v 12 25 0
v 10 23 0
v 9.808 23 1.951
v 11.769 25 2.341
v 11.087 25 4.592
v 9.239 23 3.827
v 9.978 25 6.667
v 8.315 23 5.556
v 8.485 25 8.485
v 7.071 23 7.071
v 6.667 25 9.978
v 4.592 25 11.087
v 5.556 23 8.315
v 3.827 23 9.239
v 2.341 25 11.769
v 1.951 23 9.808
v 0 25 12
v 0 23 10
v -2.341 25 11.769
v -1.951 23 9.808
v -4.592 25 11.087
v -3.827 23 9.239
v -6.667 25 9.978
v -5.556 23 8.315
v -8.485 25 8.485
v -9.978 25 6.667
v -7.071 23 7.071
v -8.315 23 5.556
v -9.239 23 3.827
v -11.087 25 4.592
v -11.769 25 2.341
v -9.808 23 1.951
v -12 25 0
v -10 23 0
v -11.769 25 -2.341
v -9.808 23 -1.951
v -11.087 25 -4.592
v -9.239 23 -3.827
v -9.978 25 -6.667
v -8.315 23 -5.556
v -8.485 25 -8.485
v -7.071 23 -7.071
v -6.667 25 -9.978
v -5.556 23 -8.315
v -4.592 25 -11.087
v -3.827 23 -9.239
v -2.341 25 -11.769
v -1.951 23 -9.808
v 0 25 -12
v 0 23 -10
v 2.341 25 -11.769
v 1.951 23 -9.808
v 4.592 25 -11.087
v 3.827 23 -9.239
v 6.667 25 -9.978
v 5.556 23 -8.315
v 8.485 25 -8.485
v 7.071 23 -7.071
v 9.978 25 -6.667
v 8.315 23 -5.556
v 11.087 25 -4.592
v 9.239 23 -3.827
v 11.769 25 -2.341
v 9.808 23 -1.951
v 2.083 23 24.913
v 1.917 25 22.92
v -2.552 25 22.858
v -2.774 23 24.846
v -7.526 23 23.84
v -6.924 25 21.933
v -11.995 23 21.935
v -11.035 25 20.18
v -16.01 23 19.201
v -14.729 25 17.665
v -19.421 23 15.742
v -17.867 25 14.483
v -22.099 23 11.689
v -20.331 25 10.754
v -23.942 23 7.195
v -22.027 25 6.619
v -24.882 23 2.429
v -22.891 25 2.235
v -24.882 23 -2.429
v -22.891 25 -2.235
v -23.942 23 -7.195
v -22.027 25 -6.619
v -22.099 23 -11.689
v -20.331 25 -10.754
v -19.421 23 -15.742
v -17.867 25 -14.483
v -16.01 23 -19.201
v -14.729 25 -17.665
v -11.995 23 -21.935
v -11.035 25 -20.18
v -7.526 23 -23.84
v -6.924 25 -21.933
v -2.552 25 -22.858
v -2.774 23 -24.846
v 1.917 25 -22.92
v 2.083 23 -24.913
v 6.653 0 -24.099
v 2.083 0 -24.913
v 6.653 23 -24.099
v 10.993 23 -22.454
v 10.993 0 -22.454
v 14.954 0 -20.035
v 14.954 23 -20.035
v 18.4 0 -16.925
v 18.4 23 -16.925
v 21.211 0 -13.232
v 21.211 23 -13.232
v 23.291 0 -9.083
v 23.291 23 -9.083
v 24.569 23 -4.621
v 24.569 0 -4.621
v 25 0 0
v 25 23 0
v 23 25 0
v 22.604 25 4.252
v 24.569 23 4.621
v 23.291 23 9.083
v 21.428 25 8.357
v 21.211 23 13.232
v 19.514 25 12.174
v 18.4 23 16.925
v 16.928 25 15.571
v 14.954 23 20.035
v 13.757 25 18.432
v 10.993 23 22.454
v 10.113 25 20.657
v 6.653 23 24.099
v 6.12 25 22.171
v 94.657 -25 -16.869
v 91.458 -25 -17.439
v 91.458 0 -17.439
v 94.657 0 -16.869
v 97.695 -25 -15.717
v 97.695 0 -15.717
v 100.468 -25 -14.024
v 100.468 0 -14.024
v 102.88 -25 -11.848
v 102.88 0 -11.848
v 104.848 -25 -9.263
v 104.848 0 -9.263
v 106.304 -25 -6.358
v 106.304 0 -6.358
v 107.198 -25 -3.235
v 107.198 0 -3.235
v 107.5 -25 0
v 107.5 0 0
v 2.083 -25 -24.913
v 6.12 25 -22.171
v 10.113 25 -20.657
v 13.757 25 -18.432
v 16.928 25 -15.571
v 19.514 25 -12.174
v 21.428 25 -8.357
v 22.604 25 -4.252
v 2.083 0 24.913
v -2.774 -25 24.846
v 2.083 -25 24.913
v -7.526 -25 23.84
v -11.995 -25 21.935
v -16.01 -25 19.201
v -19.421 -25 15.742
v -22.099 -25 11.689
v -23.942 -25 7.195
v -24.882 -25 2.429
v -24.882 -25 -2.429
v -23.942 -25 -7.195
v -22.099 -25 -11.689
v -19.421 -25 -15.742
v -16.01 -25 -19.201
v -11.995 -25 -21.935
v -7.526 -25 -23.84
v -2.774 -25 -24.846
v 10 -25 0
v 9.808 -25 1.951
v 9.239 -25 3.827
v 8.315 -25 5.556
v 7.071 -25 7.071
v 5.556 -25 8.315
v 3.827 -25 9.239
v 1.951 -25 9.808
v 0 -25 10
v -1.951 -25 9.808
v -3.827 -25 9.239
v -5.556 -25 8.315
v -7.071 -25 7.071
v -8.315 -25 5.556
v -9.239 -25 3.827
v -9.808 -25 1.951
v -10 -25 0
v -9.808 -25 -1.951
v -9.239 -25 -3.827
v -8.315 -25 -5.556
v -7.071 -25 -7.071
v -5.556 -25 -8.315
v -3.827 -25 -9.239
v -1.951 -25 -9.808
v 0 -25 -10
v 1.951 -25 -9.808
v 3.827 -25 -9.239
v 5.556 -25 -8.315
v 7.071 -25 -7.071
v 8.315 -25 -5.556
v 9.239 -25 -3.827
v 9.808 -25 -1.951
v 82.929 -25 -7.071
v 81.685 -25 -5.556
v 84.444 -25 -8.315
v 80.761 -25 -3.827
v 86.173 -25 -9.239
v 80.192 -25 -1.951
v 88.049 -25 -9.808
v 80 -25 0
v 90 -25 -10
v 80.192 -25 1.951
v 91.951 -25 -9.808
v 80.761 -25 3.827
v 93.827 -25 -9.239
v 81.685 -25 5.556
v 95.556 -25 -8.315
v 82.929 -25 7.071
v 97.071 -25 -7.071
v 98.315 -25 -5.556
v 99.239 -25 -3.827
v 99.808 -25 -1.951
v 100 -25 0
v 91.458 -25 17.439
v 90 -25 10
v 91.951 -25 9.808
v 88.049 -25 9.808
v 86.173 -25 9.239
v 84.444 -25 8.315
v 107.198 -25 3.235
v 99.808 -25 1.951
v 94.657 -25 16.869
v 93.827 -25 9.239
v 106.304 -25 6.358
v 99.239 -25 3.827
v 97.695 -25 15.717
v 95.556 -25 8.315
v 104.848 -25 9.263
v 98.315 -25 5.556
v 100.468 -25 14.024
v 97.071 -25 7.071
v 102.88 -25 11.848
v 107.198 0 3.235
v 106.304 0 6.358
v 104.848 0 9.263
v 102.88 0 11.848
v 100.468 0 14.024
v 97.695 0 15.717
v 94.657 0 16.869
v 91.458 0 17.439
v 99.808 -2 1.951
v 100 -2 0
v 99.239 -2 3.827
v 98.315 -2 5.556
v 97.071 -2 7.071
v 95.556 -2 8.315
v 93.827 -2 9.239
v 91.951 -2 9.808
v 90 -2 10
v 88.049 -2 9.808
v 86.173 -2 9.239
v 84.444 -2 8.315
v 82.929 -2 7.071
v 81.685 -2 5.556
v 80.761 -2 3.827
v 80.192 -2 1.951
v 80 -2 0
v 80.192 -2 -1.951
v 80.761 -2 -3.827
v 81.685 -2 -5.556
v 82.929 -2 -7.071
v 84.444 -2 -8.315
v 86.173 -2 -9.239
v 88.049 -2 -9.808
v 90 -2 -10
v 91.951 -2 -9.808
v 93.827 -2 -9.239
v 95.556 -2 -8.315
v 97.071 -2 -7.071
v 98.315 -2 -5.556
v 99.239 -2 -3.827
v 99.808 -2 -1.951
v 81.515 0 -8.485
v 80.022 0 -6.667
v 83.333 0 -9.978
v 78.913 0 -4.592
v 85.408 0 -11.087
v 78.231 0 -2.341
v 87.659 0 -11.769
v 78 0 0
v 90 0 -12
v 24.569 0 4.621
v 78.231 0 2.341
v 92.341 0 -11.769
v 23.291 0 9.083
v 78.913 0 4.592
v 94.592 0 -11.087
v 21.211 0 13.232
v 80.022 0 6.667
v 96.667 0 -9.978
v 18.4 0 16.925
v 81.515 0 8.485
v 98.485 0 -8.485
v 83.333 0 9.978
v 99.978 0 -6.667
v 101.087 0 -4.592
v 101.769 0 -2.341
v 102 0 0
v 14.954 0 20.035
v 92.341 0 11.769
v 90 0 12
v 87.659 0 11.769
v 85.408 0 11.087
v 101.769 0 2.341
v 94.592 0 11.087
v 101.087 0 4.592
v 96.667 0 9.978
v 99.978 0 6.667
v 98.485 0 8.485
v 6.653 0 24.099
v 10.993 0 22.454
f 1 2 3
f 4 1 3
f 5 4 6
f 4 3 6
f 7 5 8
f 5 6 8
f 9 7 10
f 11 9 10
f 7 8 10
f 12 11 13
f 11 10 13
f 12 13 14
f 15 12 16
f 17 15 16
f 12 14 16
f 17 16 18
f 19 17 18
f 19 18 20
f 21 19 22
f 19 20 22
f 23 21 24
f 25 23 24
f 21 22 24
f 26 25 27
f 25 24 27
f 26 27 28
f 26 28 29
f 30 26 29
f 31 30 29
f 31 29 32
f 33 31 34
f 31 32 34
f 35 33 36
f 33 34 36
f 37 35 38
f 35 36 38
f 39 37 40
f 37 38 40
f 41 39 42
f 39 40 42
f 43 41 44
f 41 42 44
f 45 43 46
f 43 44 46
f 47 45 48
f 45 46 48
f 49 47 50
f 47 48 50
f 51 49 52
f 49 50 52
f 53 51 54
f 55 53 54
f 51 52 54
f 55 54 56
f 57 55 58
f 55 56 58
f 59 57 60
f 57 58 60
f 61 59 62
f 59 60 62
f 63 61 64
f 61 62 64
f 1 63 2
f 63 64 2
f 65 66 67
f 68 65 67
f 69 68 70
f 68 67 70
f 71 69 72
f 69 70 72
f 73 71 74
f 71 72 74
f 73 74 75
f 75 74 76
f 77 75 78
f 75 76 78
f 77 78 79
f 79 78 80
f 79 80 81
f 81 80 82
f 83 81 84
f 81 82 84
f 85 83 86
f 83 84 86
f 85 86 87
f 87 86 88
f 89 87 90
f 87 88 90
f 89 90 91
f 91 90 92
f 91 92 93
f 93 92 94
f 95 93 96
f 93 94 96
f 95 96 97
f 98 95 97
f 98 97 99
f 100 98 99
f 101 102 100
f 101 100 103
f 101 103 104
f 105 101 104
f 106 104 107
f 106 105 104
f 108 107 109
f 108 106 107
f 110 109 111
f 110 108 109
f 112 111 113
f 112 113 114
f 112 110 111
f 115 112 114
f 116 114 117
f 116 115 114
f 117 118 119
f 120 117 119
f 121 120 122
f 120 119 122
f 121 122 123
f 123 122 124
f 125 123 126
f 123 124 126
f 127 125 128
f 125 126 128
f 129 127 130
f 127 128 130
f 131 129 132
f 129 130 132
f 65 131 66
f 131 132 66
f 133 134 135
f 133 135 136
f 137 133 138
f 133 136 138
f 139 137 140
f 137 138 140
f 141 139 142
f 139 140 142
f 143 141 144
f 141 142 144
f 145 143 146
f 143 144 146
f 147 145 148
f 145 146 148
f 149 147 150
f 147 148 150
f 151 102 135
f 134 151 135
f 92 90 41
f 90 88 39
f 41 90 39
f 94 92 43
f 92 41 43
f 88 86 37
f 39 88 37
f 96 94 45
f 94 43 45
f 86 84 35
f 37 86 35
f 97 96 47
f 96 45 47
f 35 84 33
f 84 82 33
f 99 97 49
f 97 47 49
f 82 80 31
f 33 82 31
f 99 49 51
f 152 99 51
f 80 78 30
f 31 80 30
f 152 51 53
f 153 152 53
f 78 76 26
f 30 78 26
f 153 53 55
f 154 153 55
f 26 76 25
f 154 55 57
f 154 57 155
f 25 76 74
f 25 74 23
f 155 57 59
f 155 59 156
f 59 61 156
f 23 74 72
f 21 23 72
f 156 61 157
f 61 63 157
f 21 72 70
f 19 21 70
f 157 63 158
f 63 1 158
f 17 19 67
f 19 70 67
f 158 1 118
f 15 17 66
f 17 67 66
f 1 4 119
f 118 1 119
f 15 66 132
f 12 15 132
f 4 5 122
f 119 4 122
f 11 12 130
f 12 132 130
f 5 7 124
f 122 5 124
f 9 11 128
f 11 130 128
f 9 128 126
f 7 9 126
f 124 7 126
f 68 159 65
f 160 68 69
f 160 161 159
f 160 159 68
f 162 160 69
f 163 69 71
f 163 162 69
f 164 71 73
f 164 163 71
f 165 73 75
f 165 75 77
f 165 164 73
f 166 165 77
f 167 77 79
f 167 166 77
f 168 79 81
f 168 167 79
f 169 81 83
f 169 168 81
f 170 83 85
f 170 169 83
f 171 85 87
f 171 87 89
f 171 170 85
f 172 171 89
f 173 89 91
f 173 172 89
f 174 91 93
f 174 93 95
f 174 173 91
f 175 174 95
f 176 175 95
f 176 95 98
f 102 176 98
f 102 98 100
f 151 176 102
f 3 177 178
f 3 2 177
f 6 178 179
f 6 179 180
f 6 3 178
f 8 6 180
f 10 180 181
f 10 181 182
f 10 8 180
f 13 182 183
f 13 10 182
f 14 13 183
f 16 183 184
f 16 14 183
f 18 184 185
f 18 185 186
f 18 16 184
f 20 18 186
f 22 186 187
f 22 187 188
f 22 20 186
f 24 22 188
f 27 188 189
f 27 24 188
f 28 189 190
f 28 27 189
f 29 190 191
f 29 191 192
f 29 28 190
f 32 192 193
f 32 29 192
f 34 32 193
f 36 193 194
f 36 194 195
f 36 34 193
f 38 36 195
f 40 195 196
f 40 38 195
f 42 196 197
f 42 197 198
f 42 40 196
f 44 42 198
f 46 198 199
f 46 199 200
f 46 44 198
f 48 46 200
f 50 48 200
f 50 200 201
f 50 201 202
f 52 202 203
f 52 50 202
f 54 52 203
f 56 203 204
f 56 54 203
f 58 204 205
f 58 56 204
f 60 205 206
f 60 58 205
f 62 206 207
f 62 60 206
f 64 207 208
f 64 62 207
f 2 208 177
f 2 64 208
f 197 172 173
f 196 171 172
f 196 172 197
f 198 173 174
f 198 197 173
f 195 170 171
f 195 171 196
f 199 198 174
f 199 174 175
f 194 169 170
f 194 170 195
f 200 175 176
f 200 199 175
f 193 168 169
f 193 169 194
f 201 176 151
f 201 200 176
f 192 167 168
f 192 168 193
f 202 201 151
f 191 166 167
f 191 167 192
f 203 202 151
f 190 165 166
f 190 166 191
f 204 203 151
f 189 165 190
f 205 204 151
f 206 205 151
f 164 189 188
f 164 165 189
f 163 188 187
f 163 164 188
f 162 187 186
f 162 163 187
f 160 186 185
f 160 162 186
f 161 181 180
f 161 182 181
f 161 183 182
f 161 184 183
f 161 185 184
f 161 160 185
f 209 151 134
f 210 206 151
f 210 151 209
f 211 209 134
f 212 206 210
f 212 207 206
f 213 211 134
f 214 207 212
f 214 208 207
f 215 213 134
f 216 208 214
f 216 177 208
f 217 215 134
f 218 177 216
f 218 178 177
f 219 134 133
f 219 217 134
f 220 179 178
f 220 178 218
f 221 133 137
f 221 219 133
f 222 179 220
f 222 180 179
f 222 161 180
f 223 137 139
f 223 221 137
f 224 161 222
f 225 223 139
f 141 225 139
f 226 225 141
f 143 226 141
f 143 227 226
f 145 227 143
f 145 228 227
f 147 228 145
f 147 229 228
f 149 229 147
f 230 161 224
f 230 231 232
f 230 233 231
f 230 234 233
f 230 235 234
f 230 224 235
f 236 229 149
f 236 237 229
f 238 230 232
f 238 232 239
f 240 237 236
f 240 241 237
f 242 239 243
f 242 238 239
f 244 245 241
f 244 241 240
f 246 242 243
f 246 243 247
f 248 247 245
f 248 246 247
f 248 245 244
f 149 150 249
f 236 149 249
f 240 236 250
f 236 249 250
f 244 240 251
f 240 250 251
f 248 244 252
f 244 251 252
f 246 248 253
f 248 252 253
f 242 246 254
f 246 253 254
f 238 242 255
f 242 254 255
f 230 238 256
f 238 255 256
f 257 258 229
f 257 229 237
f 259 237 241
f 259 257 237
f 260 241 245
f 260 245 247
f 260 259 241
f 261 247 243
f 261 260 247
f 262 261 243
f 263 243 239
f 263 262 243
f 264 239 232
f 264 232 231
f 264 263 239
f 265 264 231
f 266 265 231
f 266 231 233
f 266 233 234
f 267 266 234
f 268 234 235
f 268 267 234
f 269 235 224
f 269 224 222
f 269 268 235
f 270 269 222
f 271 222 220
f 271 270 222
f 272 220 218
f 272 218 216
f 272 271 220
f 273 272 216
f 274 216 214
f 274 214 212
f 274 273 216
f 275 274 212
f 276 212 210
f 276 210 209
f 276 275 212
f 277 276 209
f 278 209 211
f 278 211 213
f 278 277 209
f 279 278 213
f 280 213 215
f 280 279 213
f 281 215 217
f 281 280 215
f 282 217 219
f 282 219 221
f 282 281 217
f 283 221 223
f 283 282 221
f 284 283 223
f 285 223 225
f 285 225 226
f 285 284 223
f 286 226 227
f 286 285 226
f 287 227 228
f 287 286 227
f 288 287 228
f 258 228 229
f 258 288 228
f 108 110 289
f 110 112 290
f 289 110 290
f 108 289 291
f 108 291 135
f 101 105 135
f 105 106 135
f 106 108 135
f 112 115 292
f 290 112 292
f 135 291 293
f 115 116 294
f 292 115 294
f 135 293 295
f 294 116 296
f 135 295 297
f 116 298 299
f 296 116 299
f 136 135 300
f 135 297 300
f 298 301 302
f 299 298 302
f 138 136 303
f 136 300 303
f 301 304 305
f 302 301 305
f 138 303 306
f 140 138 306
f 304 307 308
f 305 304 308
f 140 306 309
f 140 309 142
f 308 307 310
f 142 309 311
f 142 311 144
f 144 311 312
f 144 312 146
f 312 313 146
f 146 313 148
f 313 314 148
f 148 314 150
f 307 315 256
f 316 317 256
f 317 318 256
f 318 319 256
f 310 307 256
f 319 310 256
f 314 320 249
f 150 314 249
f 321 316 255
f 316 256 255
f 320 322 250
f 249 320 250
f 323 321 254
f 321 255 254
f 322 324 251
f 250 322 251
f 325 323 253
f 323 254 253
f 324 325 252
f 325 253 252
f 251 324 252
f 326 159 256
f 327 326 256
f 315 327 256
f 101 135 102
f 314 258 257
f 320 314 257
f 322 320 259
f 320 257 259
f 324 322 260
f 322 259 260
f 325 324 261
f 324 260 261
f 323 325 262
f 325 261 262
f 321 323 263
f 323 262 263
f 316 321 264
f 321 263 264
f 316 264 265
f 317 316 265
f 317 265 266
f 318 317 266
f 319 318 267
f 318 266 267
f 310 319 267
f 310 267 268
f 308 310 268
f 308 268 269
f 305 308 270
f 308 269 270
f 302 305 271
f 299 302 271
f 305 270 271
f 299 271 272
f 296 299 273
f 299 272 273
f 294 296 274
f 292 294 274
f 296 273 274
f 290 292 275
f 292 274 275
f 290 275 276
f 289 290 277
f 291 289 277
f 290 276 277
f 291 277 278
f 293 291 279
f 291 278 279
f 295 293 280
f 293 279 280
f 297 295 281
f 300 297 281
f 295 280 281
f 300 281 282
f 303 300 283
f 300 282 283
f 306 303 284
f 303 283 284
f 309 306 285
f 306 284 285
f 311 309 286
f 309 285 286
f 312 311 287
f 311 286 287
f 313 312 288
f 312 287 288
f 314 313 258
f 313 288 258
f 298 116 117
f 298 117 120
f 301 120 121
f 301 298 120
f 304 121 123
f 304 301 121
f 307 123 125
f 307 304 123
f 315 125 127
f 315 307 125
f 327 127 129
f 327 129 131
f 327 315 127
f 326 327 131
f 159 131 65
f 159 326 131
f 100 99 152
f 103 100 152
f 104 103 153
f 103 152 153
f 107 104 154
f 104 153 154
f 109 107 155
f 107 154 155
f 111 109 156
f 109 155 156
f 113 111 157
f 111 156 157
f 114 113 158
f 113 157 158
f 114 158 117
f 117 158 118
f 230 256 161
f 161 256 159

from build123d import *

# Parameters (mm, degrees)
F0_R          = 10
F1_DEPTH      = 25
F2_DEPTH      = 25
F2_DEPTH_BACK = 25
F3_SIZE       = 2


with BuildPart() as f1:
    # F0 (on Front) → F1 (new body)
    with BuildSketch(Plane.XZ):
        with BuildLine():
            ThreePointArc((2.083333, -24.913043), (18.399502, -16.92508), (25, 0))
            ThreePointArc((25, 0), (18.399502, 16.92508), (2.083333, 24.913043))
            ThreePointArc((2.083333, 24.913043), (-25, 0), (2.083333, -24.913043))
        make_face()
        Circle(F0_R, mode=Mode.SUBTRACT)
        with BuildLine():
            ThreePointArc((2.083333, 24.913043), (18.399502, 16.92508), (25, 0))
            ThreePointArc((25, 0), (18.399502, -16.92508), (2.083333, -24.913043))
            Line((2.083333, -24.913043), (91.458333, -17.43913))
            ThreePointArc((91.458333, -17.43913), (72.5, 0), (91.458333, 17.43913))
            Line((91.458333, 17.43913), (2.083333, 24.913043))
        make_face()
        with BuildLine():
            ThreePointArc((107.5, 0), (102.879651, 11.847556), (91.458333, 17.43913))
            ThreePointArc((91.458333, 17.43913), (72.5, 0), (91.458333, -17.43913))
            ThreePointArc((91.458333, -17.43913), (102.879651, -11.847556), (107.5, 0))
        make_face()
        with Locations((90, 0)):
            Circle(F0_R, mode=Mode.SUBTRACT)
    extrude(amount=F1_DEPTH)

    # F0 (on Front) → F2 (join, two sides)
    with BuildSketch(Plane.XZ) as f2_sk:
        with BuildLine():
            ThreePointArc((2.083333, -24.913043), (18.399502, -16.92508), (25, 0))
            ThreePointArc((25, 0), (18.399502, 16.92508), (2.083333, 24.913043))
            ThreePointArc((2.083333, 24.913043), (-25, 0), (2.083333, -24.913043))
        make_face()
        Circle(F0_R, mode=Mode.SUBTRACT)
    extrude(amount=F2_DEPTH)
    extrude(f2_sk.sketch, amount=-F2_DEPTH_BACK)

    # F3
    f3_edges = [f1.edges().sort_by_distance(p)[0] for p in [
        (80, 0, 0),
        (-2.083333, 25, 24.913043),
        (-10, 25, 0),
    ]]
    chamfer(f3_edges, length=F3_SIZE)


solid = f1.part
